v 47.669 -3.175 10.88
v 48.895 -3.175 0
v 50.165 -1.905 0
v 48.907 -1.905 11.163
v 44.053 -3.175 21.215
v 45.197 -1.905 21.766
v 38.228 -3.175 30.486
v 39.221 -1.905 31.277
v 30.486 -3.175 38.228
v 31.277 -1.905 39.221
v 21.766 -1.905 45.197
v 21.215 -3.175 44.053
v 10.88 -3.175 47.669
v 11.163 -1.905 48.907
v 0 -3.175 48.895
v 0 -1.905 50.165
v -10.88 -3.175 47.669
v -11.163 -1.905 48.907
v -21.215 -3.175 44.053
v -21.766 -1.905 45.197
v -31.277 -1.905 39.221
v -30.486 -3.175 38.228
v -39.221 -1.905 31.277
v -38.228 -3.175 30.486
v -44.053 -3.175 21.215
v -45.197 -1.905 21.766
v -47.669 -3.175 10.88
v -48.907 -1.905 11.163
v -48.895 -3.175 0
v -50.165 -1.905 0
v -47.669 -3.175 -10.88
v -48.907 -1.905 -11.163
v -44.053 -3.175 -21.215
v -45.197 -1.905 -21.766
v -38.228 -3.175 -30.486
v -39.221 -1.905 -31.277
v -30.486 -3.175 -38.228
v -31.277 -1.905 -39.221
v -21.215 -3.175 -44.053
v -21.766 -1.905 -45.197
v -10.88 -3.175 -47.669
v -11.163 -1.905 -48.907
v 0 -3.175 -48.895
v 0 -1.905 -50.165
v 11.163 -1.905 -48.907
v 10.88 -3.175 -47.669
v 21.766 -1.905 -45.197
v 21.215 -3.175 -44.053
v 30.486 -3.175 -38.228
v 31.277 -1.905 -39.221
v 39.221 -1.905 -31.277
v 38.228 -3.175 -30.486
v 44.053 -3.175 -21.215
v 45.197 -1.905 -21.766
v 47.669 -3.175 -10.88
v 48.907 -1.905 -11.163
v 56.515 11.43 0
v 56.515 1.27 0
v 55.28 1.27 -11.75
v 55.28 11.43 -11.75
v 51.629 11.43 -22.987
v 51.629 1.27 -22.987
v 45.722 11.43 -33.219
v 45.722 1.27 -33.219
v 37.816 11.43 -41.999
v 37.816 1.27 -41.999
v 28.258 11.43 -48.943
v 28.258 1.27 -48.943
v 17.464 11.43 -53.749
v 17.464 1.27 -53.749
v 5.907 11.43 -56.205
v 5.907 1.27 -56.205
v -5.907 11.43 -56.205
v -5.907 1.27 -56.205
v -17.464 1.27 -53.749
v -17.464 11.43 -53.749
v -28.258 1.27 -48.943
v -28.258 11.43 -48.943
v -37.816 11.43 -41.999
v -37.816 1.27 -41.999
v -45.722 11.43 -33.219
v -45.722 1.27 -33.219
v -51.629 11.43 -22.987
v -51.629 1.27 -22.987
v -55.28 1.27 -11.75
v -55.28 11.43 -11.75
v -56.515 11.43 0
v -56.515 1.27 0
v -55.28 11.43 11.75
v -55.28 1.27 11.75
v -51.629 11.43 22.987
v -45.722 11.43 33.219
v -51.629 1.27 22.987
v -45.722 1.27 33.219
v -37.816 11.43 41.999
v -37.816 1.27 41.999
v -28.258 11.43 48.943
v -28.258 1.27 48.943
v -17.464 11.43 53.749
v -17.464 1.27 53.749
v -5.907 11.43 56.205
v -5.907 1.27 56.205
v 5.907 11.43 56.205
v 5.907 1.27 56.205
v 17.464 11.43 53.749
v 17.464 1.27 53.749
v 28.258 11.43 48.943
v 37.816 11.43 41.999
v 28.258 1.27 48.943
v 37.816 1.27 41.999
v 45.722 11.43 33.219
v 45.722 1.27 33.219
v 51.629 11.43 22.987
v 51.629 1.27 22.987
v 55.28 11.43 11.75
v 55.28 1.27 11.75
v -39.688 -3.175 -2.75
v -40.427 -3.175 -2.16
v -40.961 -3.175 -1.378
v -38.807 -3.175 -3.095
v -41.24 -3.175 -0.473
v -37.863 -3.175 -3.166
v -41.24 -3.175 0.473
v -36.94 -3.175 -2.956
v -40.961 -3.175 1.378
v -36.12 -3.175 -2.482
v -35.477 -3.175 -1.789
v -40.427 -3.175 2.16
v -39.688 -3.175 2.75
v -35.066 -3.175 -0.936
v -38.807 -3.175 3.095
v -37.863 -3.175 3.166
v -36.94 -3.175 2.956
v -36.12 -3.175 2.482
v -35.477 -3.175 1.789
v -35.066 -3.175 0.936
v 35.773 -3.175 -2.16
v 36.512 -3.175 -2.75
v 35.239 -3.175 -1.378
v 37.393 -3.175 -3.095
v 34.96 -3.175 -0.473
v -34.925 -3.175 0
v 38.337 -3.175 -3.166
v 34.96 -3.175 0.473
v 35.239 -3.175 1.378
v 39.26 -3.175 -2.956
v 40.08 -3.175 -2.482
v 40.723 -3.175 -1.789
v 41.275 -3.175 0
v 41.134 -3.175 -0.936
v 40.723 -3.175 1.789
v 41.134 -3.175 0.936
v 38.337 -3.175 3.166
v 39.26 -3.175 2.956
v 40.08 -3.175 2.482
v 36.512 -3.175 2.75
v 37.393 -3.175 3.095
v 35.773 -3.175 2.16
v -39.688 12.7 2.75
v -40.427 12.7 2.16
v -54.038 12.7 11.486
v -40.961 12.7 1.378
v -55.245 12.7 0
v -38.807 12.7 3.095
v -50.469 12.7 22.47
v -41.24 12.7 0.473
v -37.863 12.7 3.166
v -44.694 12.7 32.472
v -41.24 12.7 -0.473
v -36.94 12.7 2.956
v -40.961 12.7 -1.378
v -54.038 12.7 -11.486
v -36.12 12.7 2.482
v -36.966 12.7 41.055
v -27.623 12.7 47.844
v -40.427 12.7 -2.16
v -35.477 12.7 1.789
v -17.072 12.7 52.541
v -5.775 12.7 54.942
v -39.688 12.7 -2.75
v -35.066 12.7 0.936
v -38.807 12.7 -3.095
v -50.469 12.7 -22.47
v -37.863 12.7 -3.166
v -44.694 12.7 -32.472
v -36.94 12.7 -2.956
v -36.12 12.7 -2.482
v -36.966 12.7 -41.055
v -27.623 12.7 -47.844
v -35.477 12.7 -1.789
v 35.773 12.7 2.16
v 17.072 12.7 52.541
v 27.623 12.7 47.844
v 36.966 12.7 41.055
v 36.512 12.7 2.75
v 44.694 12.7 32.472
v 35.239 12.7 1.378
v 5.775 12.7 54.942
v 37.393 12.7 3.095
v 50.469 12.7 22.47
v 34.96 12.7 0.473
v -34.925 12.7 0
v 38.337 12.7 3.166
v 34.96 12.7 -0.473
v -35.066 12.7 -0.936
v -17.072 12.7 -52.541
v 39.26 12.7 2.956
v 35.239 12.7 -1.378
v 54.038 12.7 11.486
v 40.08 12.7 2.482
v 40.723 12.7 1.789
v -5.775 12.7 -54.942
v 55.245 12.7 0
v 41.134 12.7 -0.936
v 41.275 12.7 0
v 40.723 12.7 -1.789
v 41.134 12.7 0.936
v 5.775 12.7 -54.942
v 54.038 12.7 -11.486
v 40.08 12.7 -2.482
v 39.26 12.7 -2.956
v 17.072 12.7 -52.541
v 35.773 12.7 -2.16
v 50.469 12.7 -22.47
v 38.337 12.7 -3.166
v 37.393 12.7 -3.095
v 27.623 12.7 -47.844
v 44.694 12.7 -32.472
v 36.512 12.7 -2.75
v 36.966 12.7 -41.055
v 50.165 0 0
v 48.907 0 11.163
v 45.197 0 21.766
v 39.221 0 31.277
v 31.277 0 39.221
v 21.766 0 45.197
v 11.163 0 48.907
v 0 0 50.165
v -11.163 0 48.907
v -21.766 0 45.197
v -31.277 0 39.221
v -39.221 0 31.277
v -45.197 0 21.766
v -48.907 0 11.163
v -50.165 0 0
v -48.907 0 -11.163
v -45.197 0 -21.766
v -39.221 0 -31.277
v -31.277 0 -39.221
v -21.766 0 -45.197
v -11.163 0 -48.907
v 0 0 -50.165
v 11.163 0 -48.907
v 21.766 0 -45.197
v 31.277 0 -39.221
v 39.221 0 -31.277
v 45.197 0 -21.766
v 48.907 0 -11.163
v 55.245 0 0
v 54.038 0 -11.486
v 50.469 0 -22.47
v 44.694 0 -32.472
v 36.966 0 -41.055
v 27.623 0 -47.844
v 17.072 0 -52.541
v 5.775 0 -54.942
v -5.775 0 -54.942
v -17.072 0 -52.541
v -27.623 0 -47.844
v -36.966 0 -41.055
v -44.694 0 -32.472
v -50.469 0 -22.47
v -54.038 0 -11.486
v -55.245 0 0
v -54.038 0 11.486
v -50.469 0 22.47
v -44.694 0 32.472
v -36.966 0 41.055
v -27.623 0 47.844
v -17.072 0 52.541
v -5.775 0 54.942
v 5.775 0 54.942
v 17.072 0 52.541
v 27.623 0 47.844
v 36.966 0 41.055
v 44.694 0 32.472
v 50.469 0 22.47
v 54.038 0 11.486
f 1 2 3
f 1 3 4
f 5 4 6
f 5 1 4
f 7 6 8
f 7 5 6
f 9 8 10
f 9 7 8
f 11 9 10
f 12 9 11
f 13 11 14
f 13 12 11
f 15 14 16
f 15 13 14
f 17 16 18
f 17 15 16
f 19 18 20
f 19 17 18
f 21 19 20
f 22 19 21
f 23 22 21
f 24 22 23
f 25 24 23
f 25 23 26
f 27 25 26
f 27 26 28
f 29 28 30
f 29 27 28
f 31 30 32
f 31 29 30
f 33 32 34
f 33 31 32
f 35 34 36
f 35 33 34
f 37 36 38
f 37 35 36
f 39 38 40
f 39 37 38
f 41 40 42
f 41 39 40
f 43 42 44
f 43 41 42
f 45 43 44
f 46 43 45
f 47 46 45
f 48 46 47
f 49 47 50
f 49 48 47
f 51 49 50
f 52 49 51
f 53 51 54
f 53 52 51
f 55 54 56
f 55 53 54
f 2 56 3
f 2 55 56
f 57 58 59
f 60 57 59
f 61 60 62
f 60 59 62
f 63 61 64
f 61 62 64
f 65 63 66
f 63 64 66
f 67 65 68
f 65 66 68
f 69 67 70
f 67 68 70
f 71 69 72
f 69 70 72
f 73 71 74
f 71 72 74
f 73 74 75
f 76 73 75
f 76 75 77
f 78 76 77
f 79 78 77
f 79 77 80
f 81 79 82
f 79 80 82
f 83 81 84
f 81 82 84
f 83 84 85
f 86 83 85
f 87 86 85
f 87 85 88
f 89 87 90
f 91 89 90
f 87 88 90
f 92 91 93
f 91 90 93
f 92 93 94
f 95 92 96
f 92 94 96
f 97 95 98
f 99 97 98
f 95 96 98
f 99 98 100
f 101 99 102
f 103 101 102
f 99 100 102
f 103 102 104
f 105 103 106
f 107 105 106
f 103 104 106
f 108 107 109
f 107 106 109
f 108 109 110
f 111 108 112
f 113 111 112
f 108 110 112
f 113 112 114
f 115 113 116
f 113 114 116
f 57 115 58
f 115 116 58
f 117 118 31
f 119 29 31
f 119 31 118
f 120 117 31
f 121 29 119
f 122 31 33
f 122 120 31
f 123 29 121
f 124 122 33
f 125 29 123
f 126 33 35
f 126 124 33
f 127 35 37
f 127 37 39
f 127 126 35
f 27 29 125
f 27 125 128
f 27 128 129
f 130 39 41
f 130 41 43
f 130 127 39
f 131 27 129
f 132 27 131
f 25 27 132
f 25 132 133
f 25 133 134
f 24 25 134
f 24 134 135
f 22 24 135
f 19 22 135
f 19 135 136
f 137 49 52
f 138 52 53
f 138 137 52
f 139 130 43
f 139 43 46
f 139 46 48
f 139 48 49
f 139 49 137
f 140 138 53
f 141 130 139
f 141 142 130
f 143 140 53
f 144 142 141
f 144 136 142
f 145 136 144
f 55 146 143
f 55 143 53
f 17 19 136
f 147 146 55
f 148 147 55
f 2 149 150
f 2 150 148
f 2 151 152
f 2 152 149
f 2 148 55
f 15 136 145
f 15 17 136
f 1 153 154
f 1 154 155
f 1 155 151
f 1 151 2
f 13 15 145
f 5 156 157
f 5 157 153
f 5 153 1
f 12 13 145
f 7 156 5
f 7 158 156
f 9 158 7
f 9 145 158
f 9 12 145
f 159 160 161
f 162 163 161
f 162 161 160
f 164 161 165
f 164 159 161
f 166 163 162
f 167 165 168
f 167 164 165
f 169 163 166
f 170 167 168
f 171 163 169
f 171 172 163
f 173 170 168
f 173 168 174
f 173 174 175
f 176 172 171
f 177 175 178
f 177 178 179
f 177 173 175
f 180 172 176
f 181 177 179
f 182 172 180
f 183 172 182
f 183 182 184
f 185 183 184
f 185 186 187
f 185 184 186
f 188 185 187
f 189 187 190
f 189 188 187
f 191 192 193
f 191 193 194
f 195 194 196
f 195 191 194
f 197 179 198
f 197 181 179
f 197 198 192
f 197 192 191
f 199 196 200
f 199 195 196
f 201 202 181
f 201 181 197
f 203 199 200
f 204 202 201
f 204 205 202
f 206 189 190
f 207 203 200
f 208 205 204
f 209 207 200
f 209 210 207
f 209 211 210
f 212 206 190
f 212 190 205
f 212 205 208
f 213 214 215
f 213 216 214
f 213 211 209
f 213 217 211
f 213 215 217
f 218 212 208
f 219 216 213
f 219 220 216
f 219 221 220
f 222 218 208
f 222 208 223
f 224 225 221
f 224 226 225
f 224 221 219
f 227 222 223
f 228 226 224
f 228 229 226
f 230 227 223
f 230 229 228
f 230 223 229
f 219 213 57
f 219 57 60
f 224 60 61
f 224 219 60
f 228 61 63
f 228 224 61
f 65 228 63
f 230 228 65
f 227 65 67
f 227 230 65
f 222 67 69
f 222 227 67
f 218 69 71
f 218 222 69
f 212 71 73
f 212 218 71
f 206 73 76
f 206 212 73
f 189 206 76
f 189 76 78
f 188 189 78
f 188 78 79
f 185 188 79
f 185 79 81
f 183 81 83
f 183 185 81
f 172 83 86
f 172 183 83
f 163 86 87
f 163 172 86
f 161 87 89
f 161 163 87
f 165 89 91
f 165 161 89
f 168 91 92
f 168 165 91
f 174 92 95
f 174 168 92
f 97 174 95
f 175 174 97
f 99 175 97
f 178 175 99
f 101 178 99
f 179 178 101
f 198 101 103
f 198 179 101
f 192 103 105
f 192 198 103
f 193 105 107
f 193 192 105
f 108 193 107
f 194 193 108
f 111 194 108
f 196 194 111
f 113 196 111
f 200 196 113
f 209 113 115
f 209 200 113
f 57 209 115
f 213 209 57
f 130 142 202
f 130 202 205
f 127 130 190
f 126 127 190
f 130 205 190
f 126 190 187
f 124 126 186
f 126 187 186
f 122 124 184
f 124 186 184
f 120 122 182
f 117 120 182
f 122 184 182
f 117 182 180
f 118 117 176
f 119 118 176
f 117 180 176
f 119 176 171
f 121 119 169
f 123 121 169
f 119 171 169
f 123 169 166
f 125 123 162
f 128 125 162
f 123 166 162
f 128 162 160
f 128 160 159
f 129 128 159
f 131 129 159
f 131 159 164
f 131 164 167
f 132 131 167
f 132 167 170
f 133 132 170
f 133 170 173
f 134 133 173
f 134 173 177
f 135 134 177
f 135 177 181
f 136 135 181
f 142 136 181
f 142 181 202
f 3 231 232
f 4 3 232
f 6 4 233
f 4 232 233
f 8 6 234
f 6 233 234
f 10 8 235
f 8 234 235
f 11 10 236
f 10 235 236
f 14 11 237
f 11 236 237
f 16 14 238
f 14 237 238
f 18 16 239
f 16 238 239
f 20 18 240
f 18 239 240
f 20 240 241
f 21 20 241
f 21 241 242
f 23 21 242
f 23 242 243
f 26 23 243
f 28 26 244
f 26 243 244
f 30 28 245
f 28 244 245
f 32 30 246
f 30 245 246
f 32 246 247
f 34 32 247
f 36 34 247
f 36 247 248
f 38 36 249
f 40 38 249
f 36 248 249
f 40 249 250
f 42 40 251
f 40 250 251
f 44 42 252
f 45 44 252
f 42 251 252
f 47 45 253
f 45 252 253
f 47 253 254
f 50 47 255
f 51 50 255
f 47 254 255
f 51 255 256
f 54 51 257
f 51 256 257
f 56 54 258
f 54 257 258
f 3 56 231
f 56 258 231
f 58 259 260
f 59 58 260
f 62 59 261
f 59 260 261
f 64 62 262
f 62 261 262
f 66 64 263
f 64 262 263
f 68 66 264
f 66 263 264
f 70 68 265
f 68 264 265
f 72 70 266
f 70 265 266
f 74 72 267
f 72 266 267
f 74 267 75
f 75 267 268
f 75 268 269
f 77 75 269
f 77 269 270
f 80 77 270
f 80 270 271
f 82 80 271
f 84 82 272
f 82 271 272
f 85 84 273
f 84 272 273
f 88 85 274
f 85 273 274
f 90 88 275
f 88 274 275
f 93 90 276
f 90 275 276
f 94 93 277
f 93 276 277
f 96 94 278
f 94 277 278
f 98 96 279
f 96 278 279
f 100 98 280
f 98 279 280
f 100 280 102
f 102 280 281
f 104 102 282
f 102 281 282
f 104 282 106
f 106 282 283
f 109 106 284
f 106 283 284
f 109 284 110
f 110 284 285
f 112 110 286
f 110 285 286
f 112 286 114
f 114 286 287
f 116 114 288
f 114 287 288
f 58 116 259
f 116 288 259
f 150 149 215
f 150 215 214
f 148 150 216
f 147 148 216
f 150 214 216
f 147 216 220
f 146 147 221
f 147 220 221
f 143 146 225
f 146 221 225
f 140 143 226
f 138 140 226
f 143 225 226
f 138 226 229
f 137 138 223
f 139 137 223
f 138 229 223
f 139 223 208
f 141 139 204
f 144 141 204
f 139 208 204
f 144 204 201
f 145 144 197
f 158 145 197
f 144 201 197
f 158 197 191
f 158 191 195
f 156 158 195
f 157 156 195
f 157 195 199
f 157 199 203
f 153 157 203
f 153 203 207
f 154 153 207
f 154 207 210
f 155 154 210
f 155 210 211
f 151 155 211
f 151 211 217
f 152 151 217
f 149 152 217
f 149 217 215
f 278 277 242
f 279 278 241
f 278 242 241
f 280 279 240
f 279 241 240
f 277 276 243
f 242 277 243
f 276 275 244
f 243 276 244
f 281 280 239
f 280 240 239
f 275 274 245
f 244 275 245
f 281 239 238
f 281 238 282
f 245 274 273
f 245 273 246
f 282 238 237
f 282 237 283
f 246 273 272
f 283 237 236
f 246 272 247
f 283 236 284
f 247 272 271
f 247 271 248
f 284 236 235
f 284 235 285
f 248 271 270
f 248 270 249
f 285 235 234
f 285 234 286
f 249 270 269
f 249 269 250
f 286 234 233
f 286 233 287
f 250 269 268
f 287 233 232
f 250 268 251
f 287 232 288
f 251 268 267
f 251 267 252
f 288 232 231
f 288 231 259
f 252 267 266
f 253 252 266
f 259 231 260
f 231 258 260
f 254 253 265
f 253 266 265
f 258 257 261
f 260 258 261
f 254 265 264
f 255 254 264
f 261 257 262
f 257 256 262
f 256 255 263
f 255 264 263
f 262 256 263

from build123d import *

# Parameters (mm, degrees)
SKETCH1_R           = 56.515
BOSS_EXTRUDE1_DEPTH = 12.7
CHAMFER1_SIZE       = 1.27
SKETCH2_R           = 50.165
BOSS_EXTRUDE2_DEPTH = 3.175
CHAMFER2_SIZE       = 1.27
SKETCH3_R           = 3.175
CUT_EXTRUDE1_DEPTH  = 16.875


with BuildPart() as part:
    # Sketch1 → Boss-Extrude1 (new body)
    with BuildSketch(Plane(origin=(0, 0, 0), x_dir=(1, 0, 0), z_dir=(0, 1, 0))):
        Circle(SKETCH1_R)
    extrude(amount=BOSS_EXTRUDE1_DEPTH)

    # Chamfer1
    chamfer1_edges = [part.edges().sort_by_distance(p)[0] for p in [
        (-56.515, 0, 0),
        (-56.515, 12.7, 0),
    ]]
    chamfer(chamfer1_edges, length=CHAMFER1_SIZE)

    # Sketch2 → Boss-Extrude2 (add)
    with BuildSketch(Plane.XZ):
        Circle(SKETCH2_R)
    extrude(amount=BOSS_EXTRUDE2_DEPTH)

    # Chamfer2
    chamfer2_edges = [part.edges().sort_by_distance(p)[0] for p in [
        (-50.165, -3.175, 0),
    ]]
    chamfer(chamfer2_edges, length=CHAMFER2_SIZE)

    # Sketch3 → Cut-Extrude1 (cut, through all)
    with BuildSketch(Plane(origin=(0, 12.7, 0), x_dir=(1, 0, 0), z_dir=(0, 1, 0))):
        with Locations((-38.1, 0)):
            Circle(SKETCH3_R)
        with Locations((38.1, 0)):
            Circle(SKETCH3_R)
    extrude(amount=-CUT_EXTRUDE1_DEPTH, mode=Mode.SUBTRACT)


solid = part.part
